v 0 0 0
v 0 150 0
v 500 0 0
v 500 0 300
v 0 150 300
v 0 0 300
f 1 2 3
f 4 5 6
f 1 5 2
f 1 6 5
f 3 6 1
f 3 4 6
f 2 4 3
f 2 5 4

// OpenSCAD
$fn = 100;

length = 500;
width = 300;
height = 150;

module main() {
  linear_extrude(height=width, center=false) {
    polygon(points=[[0,0], [length,0], [0,height]]);
  }
}

main();
